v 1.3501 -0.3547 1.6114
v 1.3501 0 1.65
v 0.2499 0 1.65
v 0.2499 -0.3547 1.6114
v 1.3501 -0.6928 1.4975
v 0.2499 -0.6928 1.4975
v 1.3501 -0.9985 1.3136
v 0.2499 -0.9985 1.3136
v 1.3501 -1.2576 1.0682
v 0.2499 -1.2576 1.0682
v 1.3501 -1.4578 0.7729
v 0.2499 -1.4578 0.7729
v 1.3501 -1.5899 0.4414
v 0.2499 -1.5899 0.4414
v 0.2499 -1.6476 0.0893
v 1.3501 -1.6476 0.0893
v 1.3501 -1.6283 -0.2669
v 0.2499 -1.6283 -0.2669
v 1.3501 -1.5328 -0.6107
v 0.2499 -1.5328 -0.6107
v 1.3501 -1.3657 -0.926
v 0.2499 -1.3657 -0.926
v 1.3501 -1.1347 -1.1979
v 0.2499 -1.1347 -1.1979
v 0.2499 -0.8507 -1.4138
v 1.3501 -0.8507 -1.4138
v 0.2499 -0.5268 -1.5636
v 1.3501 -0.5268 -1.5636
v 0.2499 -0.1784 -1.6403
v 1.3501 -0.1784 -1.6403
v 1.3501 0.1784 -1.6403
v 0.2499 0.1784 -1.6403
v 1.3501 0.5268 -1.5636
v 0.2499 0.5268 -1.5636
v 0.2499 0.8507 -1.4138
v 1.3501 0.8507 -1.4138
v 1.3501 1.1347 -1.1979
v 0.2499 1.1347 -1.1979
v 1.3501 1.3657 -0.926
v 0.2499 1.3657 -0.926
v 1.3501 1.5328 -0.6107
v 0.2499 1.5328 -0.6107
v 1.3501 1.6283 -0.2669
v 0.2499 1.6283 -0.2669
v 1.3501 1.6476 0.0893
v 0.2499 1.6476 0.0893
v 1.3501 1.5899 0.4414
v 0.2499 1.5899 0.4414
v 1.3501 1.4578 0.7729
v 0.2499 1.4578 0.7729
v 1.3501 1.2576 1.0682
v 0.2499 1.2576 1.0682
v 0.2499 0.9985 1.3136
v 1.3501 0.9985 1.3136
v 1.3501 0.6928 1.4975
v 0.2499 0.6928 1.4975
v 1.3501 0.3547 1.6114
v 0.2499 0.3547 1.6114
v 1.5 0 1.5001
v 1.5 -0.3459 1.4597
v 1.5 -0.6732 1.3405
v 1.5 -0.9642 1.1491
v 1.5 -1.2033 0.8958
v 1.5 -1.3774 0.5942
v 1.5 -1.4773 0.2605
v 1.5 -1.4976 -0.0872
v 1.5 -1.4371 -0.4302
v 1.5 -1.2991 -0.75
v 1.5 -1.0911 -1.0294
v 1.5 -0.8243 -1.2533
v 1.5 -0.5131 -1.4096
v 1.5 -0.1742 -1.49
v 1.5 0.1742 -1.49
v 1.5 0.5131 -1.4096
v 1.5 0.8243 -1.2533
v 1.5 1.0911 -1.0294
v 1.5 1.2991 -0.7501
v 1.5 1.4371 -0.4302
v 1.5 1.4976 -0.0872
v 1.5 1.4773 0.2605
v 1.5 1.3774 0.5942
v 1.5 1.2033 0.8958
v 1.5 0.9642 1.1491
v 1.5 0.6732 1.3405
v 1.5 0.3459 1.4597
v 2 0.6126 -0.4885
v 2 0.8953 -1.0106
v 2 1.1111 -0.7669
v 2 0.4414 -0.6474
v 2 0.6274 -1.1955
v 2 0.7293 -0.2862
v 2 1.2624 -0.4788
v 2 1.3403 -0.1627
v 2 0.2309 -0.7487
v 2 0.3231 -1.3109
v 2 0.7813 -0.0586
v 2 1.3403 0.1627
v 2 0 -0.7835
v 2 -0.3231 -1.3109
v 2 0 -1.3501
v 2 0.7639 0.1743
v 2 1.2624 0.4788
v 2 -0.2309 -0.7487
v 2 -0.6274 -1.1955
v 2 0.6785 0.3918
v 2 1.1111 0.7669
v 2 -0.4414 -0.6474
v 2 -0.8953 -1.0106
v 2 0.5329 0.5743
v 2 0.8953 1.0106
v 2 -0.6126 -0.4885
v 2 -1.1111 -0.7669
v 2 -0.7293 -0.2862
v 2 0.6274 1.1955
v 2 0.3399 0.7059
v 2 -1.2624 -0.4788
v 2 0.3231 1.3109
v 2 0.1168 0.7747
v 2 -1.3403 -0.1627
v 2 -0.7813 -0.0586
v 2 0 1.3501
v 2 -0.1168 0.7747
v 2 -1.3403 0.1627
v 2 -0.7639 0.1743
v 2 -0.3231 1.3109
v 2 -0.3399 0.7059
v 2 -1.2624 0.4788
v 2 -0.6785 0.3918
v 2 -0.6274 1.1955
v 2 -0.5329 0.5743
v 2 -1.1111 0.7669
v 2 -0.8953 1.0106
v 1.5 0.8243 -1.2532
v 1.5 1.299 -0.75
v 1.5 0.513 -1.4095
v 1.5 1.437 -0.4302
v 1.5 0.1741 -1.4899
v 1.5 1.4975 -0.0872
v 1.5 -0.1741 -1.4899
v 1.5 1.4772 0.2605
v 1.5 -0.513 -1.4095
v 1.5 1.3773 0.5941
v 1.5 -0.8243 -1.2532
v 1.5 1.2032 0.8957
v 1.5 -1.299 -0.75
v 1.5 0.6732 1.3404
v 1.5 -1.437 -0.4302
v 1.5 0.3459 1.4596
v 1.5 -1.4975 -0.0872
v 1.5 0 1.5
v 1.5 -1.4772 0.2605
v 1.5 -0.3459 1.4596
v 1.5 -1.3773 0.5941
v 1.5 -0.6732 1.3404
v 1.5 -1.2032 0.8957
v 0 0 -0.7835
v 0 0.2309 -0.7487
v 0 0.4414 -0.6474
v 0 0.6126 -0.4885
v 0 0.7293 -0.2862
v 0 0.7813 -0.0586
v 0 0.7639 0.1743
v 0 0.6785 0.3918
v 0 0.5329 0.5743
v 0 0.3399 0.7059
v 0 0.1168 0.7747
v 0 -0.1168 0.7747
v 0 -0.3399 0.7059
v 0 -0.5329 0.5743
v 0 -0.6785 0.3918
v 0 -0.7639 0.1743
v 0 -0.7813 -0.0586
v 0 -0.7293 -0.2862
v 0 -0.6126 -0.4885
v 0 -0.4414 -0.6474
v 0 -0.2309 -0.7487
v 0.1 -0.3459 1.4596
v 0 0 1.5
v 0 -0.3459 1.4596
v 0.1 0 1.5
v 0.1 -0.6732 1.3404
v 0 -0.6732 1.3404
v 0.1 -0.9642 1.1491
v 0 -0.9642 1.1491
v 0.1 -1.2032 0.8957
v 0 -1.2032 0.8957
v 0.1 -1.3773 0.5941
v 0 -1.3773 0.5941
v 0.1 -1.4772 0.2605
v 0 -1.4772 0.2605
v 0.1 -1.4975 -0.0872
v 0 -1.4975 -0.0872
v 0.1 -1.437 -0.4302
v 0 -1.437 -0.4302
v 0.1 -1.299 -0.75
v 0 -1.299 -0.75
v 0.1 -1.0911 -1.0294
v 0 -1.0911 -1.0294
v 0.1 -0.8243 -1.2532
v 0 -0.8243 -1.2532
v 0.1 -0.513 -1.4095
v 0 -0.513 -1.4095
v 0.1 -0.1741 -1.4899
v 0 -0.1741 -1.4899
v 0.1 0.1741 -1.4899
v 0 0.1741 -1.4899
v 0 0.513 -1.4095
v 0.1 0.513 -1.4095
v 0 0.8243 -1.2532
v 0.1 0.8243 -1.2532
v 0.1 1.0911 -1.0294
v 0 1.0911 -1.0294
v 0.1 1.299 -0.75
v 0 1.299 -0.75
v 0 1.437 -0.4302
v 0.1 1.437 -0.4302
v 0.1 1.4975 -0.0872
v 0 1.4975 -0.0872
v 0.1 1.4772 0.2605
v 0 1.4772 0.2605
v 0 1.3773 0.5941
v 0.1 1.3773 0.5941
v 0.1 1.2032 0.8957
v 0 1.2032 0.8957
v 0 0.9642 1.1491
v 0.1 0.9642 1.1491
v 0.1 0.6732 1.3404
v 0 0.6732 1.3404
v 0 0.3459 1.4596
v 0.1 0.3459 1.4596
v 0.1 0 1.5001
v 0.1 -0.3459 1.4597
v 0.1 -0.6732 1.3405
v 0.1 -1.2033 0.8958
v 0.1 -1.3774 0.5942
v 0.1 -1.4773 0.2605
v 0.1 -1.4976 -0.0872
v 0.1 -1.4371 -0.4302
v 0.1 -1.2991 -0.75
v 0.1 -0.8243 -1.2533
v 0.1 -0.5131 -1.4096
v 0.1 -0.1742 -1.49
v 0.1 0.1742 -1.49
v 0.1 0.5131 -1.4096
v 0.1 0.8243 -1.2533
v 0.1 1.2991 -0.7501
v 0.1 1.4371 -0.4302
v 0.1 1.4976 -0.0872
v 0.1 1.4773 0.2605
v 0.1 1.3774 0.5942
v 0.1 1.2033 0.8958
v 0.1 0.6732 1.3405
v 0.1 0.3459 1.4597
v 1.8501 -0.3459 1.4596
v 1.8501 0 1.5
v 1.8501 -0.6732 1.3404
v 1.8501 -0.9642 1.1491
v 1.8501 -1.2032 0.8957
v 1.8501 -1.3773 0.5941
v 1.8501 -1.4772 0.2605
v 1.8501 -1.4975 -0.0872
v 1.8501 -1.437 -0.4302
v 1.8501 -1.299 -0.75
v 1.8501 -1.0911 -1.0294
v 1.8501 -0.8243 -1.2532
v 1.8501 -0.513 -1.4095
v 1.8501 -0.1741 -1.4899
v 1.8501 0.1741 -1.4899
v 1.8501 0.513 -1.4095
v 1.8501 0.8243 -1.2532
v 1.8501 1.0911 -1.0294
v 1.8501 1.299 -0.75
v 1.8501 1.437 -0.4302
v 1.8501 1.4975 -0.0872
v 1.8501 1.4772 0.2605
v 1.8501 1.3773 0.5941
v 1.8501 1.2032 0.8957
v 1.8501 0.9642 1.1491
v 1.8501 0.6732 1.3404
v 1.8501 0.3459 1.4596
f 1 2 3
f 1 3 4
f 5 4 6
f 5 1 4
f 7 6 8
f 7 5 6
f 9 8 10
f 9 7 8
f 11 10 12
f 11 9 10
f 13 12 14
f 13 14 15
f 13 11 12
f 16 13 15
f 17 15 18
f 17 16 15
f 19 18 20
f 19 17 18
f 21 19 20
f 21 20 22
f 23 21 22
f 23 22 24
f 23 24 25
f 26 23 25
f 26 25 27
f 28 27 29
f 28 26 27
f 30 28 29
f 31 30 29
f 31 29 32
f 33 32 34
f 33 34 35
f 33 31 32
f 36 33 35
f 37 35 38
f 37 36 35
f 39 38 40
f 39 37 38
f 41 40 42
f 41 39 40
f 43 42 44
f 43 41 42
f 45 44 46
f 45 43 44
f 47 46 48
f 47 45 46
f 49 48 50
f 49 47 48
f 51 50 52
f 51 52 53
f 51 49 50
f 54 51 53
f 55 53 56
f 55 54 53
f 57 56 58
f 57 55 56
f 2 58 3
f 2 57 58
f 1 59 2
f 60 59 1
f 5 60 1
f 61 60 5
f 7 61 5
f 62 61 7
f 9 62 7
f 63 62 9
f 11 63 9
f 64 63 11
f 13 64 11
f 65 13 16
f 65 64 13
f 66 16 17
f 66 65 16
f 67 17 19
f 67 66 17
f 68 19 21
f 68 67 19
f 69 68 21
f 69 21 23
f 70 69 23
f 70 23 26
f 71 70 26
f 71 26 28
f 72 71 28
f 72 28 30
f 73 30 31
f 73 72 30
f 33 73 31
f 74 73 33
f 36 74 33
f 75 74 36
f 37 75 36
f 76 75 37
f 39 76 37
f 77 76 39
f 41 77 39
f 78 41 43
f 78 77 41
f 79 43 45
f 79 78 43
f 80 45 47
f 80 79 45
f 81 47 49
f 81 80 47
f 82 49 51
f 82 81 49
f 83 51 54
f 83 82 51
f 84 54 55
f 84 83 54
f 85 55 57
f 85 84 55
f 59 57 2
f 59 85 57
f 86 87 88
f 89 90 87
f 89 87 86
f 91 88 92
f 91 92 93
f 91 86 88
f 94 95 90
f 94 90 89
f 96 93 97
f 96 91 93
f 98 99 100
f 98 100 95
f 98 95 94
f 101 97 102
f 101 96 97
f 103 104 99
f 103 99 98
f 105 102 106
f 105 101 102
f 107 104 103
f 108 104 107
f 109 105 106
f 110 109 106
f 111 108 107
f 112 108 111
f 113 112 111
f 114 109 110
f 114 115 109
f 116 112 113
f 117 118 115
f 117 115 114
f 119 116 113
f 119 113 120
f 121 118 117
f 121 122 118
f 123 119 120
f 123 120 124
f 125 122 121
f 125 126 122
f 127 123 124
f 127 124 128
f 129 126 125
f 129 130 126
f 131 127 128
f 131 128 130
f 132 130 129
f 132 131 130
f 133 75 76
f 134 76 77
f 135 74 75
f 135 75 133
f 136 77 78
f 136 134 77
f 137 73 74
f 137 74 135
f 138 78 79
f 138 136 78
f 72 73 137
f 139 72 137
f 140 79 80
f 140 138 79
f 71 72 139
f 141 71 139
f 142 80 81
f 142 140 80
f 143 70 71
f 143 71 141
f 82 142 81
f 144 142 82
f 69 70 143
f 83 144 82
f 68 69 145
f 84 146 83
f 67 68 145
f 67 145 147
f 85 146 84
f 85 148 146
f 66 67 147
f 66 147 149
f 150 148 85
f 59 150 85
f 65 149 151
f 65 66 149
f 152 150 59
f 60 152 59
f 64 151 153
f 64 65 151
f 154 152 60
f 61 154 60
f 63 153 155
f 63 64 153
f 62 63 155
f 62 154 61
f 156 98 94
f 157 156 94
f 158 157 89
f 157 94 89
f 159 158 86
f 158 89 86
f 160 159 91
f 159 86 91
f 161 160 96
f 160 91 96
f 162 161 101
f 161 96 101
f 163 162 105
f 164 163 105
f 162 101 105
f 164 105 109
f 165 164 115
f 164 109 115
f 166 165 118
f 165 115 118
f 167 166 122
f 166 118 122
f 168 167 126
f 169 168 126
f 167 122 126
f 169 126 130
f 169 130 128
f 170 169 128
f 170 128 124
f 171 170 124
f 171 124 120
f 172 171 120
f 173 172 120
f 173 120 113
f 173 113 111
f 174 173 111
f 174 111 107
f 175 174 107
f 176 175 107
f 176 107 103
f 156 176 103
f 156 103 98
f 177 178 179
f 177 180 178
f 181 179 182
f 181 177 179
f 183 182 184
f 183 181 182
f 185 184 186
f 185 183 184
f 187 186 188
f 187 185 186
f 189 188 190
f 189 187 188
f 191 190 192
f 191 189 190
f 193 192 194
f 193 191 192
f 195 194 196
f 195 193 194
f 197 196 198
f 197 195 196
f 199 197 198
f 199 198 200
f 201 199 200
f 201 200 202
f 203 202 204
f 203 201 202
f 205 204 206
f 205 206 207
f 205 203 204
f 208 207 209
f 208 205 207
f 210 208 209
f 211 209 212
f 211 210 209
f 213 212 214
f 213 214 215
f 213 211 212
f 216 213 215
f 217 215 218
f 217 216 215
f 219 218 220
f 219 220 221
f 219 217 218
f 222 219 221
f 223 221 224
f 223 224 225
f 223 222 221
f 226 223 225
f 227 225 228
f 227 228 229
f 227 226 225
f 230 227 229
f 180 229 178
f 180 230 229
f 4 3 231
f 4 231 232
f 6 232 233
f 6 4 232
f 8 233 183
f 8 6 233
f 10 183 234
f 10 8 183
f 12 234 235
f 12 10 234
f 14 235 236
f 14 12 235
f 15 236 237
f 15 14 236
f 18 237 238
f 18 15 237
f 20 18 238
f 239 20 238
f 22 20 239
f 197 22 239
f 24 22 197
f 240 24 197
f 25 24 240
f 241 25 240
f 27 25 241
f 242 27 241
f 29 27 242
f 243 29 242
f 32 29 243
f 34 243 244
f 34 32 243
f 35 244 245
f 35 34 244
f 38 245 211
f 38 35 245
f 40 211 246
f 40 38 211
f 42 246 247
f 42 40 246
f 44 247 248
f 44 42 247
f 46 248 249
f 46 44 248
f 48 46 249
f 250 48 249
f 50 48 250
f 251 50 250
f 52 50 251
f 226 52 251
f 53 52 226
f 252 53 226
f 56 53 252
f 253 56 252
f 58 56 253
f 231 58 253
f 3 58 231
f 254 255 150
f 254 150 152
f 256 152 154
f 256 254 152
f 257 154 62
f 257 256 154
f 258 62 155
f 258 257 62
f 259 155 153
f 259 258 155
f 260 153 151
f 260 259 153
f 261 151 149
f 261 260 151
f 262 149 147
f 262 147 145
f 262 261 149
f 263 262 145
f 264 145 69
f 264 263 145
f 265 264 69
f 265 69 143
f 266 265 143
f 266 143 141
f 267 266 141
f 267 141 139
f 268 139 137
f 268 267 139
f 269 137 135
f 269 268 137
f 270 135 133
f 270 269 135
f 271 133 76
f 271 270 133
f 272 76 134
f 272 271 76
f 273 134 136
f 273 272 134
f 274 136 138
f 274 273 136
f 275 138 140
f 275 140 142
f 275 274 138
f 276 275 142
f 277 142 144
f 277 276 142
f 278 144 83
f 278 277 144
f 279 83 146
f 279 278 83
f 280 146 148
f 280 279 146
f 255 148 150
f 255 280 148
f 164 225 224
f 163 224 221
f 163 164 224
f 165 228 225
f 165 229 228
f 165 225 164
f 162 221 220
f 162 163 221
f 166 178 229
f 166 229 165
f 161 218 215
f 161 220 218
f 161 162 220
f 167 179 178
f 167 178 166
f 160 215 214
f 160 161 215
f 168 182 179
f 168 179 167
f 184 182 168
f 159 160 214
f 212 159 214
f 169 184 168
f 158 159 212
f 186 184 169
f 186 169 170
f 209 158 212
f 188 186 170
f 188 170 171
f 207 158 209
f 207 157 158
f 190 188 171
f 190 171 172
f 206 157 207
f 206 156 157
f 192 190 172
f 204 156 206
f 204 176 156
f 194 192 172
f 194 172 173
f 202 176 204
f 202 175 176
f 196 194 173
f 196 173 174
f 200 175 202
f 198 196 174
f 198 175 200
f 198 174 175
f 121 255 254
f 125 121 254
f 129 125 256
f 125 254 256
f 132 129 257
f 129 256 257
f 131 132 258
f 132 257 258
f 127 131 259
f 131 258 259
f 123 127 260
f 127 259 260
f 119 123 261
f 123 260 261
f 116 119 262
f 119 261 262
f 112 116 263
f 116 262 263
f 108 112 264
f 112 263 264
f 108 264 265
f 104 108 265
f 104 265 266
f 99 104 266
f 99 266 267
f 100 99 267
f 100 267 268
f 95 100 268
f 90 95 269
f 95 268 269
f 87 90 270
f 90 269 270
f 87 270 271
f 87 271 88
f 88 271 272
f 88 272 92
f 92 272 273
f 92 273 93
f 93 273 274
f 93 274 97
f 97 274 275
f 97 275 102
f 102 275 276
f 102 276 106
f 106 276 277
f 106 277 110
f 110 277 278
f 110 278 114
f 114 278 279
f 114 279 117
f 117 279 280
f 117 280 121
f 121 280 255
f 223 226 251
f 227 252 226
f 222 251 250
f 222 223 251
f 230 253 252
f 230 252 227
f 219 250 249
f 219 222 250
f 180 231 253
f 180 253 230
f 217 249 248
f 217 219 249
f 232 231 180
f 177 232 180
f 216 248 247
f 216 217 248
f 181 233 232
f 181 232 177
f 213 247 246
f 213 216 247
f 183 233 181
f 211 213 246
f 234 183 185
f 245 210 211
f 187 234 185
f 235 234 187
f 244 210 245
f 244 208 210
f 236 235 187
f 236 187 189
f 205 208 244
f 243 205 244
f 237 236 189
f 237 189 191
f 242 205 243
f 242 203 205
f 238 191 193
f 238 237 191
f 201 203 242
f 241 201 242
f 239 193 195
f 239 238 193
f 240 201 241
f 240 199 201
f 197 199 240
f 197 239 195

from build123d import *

# Parameters (mm, degrees)
TAP1_D        = 1.567
CHAMFER1_SIZE = 0.15


with BuildPart() as part:
    # Sketch1 → Revolve1 (revolve)
    with BuildSketch(Plane.XY, mode=Mode.PRIVATE) as revolve1_sk:
        Polygon((0, 0), (0, 1.5), (0.1, 1.5), (0.1, 1.65), (1.5, 1.65), (1.5, 1.5), (2, 1.5), (2, 0), align=None)
    revolve(revolve1_sk.sketch.rotate(Axis((-87.49, 0, 0), (1, 0, 0)), 90), axis=Axis((-87.49, 0, 0), (1, 0, 0)))

    # Tap1 (through all)
    with Locations(Plane.ZY):
        with Locations((0, 0)):
            Hole(TAP1_D / 2)

    # Chamfer1
    chamfer1_edges = [part.edges().sort_by_distance(p)[0] for p in [
        (2, 0, -1.5),
        (1.5, 0, -1.65),
        (0.1, 0, -1.65),
    ]]
    chamfer(chamfer1_edges, length=CHAMFER1_SIZE - 0.0001)  # a hair under: the kernel refuses the full size


solid = part.part
